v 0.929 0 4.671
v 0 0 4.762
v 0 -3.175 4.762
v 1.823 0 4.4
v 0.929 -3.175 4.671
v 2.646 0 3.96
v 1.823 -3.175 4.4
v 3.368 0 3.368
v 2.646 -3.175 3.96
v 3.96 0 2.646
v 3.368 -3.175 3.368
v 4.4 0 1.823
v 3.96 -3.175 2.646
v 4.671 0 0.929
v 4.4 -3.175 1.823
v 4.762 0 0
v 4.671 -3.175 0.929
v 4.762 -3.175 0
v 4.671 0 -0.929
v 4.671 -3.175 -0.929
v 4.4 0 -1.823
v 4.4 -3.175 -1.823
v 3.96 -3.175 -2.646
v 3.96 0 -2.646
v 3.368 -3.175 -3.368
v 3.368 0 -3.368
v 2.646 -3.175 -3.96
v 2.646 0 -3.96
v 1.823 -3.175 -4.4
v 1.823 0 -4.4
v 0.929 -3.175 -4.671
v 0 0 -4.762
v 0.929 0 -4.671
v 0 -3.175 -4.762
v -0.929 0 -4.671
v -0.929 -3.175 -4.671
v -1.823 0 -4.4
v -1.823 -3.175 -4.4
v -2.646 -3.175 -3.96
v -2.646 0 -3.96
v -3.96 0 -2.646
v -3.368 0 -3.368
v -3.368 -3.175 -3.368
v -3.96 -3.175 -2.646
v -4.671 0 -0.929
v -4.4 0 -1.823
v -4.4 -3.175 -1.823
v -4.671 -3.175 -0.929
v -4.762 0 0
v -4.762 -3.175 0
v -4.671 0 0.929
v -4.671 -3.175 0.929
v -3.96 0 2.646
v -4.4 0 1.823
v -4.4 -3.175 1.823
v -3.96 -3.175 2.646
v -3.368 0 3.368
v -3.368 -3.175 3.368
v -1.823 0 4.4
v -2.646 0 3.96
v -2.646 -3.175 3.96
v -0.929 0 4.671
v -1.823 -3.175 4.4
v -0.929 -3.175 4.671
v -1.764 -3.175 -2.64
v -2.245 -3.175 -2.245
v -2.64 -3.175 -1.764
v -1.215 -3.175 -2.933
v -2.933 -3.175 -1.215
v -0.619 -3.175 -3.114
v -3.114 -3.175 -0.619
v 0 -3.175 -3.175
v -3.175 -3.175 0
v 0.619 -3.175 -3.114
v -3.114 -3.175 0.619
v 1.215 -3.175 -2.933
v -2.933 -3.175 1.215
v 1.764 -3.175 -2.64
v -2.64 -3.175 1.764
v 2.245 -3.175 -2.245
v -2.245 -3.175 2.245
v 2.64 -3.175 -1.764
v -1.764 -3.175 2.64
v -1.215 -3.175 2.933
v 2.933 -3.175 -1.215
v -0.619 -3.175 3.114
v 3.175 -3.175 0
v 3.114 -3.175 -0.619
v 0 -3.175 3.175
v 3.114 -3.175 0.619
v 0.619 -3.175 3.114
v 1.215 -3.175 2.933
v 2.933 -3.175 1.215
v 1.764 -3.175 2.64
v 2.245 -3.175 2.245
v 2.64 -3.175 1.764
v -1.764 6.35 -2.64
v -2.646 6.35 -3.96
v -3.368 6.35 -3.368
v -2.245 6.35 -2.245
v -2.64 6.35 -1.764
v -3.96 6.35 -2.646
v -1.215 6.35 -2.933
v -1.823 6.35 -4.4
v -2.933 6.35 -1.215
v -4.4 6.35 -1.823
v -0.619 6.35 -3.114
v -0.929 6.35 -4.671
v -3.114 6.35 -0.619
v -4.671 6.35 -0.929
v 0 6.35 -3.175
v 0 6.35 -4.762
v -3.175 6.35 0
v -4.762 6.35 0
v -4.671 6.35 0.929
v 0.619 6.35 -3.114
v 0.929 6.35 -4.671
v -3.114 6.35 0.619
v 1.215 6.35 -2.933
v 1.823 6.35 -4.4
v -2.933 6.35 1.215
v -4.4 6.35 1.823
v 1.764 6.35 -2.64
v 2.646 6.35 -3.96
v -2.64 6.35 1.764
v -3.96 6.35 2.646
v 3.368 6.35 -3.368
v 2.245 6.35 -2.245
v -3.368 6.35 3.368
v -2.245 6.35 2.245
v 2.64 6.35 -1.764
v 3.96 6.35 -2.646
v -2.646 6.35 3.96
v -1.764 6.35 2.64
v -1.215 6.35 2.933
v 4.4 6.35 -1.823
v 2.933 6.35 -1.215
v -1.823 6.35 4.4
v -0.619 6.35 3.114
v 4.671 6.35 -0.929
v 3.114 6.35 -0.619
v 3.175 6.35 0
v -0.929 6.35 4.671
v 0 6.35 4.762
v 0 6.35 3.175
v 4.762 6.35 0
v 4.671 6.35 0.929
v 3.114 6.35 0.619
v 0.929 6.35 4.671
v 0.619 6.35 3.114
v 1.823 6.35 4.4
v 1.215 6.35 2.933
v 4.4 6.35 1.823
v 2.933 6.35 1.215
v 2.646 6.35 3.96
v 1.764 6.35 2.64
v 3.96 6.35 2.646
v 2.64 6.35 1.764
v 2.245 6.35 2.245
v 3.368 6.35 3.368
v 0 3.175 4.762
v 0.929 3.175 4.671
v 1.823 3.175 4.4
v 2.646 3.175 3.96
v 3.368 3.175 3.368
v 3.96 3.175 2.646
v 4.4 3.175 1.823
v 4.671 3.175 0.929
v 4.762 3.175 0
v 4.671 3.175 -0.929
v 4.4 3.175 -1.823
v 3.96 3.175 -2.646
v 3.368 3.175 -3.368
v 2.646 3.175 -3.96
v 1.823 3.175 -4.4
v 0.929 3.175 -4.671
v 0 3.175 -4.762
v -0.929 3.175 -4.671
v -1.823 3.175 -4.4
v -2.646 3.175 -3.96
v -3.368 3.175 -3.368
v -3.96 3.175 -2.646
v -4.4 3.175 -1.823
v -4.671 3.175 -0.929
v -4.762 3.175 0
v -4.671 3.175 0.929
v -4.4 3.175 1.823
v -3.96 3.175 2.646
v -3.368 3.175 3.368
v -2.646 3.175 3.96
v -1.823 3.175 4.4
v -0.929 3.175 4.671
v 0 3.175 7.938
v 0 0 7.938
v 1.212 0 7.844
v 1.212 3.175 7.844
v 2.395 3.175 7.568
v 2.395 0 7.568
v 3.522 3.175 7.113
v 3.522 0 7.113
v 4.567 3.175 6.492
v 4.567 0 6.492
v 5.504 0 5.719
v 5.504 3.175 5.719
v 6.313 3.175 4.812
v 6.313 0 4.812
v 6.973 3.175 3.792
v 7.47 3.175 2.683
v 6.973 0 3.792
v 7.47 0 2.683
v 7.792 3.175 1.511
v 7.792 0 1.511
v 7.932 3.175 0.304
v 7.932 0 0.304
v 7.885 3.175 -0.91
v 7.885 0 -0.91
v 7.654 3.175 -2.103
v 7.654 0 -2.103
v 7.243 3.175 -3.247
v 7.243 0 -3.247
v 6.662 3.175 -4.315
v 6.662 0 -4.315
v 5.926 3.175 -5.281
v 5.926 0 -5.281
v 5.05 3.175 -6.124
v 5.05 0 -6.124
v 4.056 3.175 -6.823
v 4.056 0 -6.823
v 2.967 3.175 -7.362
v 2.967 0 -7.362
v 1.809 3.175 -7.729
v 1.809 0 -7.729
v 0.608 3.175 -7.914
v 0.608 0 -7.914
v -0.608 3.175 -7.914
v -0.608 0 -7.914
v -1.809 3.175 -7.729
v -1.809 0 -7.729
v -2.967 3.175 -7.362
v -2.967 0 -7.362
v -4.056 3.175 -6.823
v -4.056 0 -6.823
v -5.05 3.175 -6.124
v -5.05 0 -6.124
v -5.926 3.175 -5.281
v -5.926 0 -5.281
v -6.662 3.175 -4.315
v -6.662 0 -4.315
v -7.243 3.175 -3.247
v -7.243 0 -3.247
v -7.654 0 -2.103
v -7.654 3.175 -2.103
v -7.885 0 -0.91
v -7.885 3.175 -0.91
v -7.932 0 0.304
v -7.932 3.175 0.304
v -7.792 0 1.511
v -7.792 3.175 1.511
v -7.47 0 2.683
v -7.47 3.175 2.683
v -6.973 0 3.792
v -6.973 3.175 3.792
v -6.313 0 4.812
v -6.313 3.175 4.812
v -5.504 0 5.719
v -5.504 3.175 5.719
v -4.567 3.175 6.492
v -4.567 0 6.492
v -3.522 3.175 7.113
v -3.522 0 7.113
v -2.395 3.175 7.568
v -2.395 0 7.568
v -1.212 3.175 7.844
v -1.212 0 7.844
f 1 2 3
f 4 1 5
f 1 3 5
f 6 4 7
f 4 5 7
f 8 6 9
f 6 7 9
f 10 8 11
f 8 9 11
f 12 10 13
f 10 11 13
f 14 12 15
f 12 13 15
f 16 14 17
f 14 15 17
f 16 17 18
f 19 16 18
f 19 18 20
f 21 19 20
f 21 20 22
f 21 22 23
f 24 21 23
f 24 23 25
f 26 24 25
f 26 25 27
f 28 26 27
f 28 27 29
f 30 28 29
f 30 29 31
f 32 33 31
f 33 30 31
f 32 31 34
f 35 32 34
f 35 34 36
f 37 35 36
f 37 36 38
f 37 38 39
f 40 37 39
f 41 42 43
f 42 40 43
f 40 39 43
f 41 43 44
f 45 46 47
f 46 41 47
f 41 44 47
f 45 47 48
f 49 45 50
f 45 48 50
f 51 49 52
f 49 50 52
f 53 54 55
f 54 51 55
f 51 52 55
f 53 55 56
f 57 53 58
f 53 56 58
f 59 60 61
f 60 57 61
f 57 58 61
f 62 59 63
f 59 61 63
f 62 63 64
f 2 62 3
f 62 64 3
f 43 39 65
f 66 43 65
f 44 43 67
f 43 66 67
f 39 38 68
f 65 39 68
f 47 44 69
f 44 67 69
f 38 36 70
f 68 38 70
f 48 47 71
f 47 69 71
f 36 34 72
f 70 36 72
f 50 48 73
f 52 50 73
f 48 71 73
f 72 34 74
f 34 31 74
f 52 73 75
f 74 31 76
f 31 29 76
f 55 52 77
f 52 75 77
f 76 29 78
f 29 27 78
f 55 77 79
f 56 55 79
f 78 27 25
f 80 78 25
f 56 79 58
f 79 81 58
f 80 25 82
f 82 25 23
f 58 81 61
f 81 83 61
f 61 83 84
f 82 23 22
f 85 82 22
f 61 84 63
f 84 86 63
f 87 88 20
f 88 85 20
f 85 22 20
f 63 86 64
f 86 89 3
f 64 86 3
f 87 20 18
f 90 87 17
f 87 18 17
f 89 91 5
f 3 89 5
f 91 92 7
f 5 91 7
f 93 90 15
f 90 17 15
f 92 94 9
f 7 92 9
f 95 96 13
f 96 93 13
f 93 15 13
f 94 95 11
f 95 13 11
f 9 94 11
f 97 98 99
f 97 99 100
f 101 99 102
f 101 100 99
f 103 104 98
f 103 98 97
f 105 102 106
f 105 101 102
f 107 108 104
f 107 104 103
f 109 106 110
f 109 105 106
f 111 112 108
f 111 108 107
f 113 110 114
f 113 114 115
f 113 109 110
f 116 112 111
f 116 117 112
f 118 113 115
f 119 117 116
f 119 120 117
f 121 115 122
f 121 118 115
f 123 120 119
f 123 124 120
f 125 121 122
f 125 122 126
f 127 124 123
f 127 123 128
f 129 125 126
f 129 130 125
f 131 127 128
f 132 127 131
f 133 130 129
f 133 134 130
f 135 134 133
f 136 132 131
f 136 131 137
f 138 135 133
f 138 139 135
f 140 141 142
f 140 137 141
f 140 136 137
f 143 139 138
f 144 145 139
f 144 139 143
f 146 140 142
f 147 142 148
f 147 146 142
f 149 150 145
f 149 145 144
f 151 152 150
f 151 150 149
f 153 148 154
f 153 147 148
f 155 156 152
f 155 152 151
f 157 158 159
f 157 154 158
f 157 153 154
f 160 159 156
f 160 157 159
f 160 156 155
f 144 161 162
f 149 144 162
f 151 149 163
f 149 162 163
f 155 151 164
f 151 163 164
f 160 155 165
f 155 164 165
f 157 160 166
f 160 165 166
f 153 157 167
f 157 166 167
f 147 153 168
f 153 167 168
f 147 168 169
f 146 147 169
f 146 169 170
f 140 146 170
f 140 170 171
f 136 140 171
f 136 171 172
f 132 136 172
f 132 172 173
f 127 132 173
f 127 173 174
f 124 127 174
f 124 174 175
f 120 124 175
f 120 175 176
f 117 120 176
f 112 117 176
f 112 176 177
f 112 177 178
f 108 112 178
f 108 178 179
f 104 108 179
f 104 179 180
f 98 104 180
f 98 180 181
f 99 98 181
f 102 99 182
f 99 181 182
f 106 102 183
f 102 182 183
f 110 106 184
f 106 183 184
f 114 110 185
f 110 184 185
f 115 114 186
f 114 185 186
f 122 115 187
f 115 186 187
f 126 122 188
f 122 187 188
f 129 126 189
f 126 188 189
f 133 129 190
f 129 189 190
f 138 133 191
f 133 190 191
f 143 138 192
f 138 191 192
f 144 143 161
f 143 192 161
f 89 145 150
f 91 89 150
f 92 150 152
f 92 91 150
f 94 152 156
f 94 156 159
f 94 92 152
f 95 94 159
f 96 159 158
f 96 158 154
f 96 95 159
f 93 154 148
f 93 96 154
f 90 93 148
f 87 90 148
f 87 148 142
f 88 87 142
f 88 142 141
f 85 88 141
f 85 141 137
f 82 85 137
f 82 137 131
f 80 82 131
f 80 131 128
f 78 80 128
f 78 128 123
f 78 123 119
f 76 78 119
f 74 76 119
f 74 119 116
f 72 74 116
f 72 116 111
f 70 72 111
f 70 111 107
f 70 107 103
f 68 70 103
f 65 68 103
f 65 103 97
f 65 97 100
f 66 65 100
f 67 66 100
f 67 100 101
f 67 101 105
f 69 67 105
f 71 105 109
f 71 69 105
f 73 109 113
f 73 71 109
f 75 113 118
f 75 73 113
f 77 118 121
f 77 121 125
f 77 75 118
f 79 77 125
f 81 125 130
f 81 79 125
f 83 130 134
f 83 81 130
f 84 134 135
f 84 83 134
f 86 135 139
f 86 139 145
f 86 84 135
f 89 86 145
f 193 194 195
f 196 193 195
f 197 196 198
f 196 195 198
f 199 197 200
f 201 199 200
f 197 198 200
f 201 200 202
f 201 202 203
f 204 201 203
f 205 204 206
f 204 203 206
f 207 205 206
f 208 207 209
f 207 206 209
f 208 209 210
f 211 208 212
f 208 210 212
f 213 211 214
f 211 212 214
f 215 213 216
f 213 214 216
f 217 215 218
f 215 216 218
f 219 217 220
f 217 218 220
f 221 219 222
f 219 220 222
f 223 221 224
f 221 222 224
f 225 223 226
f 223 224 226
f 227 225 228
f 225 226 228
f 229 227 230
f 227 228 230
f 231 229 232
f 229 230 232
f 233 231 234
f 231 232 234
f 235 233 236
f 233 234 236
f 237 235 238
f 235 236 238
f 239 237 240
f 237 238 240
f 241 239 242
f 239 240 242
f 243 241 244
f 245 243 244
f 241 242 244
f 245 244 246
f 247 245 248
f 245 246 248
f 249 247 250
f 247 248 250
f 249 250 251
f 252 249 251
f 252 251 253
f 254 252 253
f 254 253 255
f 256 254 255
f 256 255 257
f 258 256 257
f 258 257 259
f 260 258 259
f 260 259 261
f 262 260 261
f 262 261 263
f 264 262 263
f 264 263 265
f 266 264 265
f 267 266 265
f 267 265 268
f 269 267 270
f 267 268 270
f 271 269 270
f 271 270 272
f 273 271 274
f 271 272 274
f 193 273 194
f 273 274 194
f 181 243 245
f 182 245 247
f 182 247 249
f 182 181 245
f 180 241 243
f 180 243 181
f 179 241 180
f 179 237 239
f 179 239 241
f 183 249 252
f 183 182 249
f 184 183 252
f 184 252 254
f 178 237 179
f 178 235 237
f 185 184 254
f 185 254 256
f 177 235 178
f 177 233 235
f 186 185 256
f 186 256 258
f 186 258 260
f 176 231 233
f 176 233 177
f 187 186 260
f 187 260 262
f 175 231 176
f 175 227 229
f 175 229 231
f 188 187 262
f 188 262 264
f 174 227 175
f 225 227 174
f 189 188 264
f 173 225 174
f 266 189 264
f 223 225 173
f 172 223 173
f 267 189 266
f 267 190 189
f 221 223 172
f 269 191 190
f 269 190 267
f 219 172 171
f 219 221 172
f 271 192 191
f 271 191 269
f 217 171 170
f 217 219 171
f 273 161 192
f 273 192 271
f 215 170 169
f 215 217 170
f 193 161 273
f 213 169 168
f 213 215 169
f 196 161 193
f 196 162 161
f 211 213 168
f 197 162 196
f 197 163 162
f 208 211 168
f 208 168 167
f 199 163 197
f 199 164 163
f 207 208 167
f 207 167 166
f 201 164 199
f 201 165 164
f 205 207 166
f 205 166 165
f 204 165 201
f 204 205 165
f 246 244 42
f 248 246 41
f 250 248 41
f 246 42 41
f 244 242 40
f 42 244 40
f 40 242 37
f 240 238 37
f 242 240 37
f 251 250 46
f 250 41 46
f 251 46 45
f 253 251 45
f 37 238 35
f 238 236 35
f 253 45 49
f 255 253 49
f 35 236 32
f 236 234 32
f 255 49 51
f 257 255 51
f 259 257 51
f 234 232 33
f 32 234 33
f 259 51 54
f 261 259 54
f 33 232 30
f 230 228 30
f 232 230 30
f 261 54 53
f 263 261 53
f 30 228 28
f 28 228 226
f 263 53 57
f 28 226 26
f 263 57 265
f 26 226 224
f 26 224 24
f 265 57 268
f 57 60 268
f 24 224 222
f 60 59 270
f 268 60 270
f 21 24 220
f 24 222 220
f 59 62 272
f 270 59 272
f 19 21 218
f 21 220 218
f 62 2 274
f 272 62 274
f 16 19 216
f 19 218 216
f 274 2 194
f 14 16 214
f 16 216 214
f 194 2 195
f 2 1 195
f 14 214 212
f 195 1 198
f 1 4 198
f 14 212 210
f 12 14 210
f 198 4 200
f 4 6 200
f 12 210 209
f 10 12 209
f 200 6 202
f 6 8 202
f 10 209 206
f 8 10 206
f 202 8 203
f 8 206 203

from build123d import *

# Parameters (mm, degrees)
SKETCH1_R                = 7.9375
SKETCH1_R_2              = 3.175
BOSS_EXTRUDE1_DEPTH      = 3.175
BOSS_EXTRUDE2_DEPTH      = 3.175
BOSS_EXTRUDE2_DEPTH_BACK = 6.35
SKETCH2_R                = 4.7625
SKETCH2_R_2              = 3.175


with BuildPart() as part:
    # Sketch1 → Boss-Extrude1 (new body)
    with BuildSketch(Plane(origin=(0, 0, 0), x_dir=(1, 0, 0), z_dir=(0, 1, 0))):
        with Locations(Location((0, 0, 0), (0, 0, 270))):
            Circle(SKETCH1_R)
        with Locations(Location((0, 0, 0), (0, 0, 270))):
            Circle(SKETCH1_R_2, mode=Mode.SUBTRACT)
    extrude(amount=BOSS_EXTRUDE1_DEPTH)

    # Sketch2 → Boss-Extrude2 (add, two sides: drawn at the far end of the back side and taken through both)
    with BuildSketch(Plane(origin=(0, 3.175, 0), x_dir=(1, 0, 0), z_dir=(0, 1, 0)).offset(-BOSS_EXTRUDE2_DEPTH_BACK)):
        with Locations(Location((0, 0, 0), (0, 0, 270))):
            Circle(SKETCH2_R)
        with Locations(Location((0, 0, 0), (0, 0, 270))):
            Circle(SKETCH2_R_2, mode=Mode.SUBTRACT)
    extrude(amount=BOSS_EXTRUDE2_DEPTH + BOSS_EXTRUDE2_DEPTH_BACK)


solid = part.part
